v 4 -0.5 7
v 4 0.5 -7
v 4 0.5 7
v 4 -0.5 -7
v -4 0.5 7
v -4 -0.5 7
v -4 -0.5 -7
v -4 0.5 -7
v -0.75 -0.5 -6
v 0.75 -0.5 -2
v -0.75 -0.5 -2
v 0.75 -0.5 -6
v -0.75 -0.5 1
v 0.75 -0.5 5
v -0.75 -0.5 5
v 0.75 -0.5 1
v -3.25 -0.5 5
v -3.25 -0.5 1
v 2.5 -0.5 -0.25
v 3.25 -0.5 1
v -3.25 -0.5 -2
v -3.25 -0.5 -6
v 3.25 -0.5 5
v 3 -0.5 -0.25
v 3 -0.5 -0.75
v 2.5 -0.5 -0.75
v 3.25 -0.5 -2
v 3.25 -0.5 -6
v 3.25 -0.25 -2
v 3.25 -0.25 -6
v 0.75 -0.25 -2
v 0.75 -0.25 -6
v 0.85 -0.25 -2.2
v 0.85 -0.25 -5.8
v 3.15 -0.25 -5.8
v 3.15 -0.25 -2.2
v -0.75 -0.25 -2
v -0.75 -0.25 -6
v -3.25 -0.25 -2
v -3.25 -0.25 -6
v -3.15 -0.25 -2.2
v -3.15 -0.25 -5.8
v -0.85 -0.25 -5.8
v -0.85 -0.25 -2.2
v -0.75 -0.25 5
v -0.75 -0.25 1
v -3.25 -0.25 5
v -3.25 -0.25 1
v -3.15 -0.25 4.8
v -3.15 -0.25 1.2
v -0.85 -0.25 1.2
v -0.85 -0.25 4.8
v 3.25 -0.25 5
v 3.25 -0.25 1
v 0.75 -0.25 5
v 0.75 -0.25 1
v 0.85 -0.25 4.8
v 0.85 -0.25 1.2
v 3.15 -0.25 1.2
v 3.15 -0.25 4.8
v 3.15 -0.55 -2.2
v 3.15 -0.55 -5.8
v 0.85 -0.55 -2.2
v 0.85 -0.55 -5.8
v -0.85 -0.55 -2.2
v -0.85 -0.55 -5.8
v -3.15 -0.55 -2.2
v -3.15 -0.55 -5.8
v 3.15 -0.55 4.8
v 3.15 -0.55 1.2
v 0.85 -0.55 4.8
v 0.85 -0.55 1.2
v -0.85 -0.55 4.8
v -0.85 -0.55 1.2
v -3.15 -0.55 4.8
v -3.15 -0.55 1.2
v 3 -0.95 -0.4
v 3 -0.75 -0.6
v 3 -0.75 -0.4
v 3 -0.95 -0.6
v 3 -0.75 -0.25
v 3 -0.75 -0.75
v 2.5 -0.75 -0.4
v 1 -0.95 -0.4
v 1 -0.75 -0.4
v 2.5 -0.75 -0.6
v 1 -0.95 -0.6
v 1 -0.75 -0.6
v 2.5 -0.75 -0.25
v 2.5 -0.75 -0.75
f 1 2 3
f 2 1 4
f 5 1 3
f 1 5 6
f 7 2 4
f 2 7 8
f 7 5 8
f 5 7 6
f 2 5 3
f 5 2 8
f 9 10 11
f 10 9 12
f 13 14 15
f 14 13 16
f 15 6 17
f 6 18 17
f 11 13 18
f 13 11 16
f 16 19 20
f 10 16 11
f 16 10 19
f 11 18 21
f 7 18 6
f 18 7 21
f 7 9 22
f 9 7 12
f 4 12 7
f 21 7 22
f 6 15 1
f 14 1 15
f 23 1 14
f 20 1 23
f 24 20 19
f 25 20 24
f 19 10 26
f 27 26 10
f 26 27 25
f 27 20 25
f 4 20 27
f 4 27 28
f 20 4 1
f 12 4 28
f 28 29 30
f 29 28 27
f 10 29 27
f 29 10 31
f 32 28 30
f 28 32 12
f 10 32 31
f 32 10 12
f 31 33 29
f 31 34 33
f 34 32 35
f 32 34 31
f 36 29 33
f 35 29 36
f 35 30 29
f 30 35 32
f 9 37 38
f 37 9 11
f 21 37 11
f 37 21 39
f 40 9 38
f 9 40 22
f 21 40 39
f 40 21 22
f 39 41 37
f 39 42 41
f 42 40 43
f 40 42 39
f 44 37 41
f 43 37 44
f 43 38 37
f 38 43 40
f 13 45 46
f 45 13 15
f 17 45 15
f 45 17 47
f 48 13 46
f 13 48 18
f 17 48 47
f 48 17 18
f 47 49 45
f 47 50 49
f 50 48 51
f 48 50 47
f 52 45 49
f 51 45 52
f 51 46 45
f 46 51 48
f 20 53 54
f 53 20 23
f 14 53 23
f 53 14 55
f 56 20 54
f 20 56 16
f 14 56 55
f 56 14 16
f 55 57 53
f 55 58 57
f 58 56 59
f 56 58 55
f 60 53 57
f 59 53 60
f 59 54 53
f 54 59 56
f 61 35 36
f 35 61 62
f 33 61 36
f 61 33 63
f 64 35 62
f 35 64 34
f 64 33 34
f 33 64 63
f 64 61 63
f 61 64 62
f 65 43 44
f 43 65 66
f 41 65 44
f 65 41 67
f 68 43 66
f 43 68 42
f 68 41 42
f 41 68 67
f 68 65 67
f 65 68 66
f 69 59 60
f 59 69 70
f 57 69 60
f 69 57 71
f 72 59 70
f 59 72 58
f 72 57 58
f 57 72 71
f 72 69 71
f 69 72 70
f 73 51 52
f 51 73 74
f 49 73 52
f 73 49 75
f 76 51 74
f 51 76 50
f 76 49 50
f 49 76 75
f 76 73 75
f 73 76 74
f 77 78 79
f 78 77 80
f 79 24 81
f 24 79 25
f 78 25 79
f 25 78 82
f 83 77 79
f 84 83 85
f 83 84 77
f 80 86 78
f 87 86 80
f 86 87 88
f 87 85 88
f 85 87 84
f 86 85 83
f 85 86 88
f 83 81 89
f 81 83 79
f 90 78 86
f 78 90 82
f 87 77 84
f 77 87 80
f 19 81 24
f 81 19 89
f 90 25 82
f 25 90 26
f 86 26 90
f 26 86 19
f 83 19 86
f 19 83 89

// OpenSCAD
module Door_01(){
    difference(){
        color("#664433")
        cube([8,1,14], center = true );

        color("#553311")
        translate([2,-1,-4])
        color("#664433")
        cube([2.5,1.5,4], center = true );

        color("#553311")
        translate([-2,-1,-4])
        color("#664433")
        cube([2.5,1.5,4], center = true );

        color("#553311")
        translate([-2,-1,3])
        color("#664433")
        cube([2.5,1.5,4], center = true );
         
        color("#553311"){
        translate([2,-1,3])
        cube([2.5,1.5,4], center = true );
        }

    }

    color("#664433")
    translate([2,-0.3,-4])
    cube([2.3,0.5,3.6], center = true);

    color("#664433")
    translate([-2,-0.3,-4])
    cube([2.3,0.5,3.6], center = true);

    color("#664433")
    translate([2,-0.3,3])
    cube([2.3,0.5,3.6], center = true);

    color("#664433")
    translate([-2,-0.3,3])
    cube([2.3,0.5,3.6], center = true);

    color("#ada192")
    translate([2,-0.85,-0.5])
    
    color("#664433")
    cube([2,0.2,0.2], center = true );
    
    color("#ada192")
    translate([2.75,-0.5,-0.5])
    cube([0.5,0.5,0.5], center = true );

}


Door_01();

// Written by Nicolì Angelo (Gengio) 2024: 
// MIT License

//Permission is hereby granted, free of charge, to any person obtaining a copy of this software and associated documentation files (the "Software"), to deal in the Software without restriction, including without limitation the rights to use, copy, modify, merge, publish, distribute, sublicense, and/or sell copies of the Software, and to permit persons to whom the Software is furnished to do so, subject to the following conditions:

//The above copyright notice and this permission notice shall be included in all copies or substantial portions of the Software.

//THE SOFTWARE IS PROVIDED "AS IS", WITHOUT WARRANTY OF ANY KIND, EXPRESS OR IMPLIED, INCLUDING BUT NOT LIMITED TO THE WARRANTIES OF MERCHANTABILITY, FITNESS FOR A PARTICULAR PURPOSE AND NONINFRINGEMENT. IN NO EVENT SHALL THE AUTHORS OR COPYRIGHT HOLDERS BE LIABLE FOR ANY CLAIM, DAMAGES OR OTHER LIABILITY, WHETHER IN AN ACTION OF CONTRACT, TORT OR OTHERWISE, ARISING FROM, OUT OF OR IN CONNECTION WITH THE SOFTWARE OR THE USE OR OTHER DEALINGS IN THE SOFTWARE.
